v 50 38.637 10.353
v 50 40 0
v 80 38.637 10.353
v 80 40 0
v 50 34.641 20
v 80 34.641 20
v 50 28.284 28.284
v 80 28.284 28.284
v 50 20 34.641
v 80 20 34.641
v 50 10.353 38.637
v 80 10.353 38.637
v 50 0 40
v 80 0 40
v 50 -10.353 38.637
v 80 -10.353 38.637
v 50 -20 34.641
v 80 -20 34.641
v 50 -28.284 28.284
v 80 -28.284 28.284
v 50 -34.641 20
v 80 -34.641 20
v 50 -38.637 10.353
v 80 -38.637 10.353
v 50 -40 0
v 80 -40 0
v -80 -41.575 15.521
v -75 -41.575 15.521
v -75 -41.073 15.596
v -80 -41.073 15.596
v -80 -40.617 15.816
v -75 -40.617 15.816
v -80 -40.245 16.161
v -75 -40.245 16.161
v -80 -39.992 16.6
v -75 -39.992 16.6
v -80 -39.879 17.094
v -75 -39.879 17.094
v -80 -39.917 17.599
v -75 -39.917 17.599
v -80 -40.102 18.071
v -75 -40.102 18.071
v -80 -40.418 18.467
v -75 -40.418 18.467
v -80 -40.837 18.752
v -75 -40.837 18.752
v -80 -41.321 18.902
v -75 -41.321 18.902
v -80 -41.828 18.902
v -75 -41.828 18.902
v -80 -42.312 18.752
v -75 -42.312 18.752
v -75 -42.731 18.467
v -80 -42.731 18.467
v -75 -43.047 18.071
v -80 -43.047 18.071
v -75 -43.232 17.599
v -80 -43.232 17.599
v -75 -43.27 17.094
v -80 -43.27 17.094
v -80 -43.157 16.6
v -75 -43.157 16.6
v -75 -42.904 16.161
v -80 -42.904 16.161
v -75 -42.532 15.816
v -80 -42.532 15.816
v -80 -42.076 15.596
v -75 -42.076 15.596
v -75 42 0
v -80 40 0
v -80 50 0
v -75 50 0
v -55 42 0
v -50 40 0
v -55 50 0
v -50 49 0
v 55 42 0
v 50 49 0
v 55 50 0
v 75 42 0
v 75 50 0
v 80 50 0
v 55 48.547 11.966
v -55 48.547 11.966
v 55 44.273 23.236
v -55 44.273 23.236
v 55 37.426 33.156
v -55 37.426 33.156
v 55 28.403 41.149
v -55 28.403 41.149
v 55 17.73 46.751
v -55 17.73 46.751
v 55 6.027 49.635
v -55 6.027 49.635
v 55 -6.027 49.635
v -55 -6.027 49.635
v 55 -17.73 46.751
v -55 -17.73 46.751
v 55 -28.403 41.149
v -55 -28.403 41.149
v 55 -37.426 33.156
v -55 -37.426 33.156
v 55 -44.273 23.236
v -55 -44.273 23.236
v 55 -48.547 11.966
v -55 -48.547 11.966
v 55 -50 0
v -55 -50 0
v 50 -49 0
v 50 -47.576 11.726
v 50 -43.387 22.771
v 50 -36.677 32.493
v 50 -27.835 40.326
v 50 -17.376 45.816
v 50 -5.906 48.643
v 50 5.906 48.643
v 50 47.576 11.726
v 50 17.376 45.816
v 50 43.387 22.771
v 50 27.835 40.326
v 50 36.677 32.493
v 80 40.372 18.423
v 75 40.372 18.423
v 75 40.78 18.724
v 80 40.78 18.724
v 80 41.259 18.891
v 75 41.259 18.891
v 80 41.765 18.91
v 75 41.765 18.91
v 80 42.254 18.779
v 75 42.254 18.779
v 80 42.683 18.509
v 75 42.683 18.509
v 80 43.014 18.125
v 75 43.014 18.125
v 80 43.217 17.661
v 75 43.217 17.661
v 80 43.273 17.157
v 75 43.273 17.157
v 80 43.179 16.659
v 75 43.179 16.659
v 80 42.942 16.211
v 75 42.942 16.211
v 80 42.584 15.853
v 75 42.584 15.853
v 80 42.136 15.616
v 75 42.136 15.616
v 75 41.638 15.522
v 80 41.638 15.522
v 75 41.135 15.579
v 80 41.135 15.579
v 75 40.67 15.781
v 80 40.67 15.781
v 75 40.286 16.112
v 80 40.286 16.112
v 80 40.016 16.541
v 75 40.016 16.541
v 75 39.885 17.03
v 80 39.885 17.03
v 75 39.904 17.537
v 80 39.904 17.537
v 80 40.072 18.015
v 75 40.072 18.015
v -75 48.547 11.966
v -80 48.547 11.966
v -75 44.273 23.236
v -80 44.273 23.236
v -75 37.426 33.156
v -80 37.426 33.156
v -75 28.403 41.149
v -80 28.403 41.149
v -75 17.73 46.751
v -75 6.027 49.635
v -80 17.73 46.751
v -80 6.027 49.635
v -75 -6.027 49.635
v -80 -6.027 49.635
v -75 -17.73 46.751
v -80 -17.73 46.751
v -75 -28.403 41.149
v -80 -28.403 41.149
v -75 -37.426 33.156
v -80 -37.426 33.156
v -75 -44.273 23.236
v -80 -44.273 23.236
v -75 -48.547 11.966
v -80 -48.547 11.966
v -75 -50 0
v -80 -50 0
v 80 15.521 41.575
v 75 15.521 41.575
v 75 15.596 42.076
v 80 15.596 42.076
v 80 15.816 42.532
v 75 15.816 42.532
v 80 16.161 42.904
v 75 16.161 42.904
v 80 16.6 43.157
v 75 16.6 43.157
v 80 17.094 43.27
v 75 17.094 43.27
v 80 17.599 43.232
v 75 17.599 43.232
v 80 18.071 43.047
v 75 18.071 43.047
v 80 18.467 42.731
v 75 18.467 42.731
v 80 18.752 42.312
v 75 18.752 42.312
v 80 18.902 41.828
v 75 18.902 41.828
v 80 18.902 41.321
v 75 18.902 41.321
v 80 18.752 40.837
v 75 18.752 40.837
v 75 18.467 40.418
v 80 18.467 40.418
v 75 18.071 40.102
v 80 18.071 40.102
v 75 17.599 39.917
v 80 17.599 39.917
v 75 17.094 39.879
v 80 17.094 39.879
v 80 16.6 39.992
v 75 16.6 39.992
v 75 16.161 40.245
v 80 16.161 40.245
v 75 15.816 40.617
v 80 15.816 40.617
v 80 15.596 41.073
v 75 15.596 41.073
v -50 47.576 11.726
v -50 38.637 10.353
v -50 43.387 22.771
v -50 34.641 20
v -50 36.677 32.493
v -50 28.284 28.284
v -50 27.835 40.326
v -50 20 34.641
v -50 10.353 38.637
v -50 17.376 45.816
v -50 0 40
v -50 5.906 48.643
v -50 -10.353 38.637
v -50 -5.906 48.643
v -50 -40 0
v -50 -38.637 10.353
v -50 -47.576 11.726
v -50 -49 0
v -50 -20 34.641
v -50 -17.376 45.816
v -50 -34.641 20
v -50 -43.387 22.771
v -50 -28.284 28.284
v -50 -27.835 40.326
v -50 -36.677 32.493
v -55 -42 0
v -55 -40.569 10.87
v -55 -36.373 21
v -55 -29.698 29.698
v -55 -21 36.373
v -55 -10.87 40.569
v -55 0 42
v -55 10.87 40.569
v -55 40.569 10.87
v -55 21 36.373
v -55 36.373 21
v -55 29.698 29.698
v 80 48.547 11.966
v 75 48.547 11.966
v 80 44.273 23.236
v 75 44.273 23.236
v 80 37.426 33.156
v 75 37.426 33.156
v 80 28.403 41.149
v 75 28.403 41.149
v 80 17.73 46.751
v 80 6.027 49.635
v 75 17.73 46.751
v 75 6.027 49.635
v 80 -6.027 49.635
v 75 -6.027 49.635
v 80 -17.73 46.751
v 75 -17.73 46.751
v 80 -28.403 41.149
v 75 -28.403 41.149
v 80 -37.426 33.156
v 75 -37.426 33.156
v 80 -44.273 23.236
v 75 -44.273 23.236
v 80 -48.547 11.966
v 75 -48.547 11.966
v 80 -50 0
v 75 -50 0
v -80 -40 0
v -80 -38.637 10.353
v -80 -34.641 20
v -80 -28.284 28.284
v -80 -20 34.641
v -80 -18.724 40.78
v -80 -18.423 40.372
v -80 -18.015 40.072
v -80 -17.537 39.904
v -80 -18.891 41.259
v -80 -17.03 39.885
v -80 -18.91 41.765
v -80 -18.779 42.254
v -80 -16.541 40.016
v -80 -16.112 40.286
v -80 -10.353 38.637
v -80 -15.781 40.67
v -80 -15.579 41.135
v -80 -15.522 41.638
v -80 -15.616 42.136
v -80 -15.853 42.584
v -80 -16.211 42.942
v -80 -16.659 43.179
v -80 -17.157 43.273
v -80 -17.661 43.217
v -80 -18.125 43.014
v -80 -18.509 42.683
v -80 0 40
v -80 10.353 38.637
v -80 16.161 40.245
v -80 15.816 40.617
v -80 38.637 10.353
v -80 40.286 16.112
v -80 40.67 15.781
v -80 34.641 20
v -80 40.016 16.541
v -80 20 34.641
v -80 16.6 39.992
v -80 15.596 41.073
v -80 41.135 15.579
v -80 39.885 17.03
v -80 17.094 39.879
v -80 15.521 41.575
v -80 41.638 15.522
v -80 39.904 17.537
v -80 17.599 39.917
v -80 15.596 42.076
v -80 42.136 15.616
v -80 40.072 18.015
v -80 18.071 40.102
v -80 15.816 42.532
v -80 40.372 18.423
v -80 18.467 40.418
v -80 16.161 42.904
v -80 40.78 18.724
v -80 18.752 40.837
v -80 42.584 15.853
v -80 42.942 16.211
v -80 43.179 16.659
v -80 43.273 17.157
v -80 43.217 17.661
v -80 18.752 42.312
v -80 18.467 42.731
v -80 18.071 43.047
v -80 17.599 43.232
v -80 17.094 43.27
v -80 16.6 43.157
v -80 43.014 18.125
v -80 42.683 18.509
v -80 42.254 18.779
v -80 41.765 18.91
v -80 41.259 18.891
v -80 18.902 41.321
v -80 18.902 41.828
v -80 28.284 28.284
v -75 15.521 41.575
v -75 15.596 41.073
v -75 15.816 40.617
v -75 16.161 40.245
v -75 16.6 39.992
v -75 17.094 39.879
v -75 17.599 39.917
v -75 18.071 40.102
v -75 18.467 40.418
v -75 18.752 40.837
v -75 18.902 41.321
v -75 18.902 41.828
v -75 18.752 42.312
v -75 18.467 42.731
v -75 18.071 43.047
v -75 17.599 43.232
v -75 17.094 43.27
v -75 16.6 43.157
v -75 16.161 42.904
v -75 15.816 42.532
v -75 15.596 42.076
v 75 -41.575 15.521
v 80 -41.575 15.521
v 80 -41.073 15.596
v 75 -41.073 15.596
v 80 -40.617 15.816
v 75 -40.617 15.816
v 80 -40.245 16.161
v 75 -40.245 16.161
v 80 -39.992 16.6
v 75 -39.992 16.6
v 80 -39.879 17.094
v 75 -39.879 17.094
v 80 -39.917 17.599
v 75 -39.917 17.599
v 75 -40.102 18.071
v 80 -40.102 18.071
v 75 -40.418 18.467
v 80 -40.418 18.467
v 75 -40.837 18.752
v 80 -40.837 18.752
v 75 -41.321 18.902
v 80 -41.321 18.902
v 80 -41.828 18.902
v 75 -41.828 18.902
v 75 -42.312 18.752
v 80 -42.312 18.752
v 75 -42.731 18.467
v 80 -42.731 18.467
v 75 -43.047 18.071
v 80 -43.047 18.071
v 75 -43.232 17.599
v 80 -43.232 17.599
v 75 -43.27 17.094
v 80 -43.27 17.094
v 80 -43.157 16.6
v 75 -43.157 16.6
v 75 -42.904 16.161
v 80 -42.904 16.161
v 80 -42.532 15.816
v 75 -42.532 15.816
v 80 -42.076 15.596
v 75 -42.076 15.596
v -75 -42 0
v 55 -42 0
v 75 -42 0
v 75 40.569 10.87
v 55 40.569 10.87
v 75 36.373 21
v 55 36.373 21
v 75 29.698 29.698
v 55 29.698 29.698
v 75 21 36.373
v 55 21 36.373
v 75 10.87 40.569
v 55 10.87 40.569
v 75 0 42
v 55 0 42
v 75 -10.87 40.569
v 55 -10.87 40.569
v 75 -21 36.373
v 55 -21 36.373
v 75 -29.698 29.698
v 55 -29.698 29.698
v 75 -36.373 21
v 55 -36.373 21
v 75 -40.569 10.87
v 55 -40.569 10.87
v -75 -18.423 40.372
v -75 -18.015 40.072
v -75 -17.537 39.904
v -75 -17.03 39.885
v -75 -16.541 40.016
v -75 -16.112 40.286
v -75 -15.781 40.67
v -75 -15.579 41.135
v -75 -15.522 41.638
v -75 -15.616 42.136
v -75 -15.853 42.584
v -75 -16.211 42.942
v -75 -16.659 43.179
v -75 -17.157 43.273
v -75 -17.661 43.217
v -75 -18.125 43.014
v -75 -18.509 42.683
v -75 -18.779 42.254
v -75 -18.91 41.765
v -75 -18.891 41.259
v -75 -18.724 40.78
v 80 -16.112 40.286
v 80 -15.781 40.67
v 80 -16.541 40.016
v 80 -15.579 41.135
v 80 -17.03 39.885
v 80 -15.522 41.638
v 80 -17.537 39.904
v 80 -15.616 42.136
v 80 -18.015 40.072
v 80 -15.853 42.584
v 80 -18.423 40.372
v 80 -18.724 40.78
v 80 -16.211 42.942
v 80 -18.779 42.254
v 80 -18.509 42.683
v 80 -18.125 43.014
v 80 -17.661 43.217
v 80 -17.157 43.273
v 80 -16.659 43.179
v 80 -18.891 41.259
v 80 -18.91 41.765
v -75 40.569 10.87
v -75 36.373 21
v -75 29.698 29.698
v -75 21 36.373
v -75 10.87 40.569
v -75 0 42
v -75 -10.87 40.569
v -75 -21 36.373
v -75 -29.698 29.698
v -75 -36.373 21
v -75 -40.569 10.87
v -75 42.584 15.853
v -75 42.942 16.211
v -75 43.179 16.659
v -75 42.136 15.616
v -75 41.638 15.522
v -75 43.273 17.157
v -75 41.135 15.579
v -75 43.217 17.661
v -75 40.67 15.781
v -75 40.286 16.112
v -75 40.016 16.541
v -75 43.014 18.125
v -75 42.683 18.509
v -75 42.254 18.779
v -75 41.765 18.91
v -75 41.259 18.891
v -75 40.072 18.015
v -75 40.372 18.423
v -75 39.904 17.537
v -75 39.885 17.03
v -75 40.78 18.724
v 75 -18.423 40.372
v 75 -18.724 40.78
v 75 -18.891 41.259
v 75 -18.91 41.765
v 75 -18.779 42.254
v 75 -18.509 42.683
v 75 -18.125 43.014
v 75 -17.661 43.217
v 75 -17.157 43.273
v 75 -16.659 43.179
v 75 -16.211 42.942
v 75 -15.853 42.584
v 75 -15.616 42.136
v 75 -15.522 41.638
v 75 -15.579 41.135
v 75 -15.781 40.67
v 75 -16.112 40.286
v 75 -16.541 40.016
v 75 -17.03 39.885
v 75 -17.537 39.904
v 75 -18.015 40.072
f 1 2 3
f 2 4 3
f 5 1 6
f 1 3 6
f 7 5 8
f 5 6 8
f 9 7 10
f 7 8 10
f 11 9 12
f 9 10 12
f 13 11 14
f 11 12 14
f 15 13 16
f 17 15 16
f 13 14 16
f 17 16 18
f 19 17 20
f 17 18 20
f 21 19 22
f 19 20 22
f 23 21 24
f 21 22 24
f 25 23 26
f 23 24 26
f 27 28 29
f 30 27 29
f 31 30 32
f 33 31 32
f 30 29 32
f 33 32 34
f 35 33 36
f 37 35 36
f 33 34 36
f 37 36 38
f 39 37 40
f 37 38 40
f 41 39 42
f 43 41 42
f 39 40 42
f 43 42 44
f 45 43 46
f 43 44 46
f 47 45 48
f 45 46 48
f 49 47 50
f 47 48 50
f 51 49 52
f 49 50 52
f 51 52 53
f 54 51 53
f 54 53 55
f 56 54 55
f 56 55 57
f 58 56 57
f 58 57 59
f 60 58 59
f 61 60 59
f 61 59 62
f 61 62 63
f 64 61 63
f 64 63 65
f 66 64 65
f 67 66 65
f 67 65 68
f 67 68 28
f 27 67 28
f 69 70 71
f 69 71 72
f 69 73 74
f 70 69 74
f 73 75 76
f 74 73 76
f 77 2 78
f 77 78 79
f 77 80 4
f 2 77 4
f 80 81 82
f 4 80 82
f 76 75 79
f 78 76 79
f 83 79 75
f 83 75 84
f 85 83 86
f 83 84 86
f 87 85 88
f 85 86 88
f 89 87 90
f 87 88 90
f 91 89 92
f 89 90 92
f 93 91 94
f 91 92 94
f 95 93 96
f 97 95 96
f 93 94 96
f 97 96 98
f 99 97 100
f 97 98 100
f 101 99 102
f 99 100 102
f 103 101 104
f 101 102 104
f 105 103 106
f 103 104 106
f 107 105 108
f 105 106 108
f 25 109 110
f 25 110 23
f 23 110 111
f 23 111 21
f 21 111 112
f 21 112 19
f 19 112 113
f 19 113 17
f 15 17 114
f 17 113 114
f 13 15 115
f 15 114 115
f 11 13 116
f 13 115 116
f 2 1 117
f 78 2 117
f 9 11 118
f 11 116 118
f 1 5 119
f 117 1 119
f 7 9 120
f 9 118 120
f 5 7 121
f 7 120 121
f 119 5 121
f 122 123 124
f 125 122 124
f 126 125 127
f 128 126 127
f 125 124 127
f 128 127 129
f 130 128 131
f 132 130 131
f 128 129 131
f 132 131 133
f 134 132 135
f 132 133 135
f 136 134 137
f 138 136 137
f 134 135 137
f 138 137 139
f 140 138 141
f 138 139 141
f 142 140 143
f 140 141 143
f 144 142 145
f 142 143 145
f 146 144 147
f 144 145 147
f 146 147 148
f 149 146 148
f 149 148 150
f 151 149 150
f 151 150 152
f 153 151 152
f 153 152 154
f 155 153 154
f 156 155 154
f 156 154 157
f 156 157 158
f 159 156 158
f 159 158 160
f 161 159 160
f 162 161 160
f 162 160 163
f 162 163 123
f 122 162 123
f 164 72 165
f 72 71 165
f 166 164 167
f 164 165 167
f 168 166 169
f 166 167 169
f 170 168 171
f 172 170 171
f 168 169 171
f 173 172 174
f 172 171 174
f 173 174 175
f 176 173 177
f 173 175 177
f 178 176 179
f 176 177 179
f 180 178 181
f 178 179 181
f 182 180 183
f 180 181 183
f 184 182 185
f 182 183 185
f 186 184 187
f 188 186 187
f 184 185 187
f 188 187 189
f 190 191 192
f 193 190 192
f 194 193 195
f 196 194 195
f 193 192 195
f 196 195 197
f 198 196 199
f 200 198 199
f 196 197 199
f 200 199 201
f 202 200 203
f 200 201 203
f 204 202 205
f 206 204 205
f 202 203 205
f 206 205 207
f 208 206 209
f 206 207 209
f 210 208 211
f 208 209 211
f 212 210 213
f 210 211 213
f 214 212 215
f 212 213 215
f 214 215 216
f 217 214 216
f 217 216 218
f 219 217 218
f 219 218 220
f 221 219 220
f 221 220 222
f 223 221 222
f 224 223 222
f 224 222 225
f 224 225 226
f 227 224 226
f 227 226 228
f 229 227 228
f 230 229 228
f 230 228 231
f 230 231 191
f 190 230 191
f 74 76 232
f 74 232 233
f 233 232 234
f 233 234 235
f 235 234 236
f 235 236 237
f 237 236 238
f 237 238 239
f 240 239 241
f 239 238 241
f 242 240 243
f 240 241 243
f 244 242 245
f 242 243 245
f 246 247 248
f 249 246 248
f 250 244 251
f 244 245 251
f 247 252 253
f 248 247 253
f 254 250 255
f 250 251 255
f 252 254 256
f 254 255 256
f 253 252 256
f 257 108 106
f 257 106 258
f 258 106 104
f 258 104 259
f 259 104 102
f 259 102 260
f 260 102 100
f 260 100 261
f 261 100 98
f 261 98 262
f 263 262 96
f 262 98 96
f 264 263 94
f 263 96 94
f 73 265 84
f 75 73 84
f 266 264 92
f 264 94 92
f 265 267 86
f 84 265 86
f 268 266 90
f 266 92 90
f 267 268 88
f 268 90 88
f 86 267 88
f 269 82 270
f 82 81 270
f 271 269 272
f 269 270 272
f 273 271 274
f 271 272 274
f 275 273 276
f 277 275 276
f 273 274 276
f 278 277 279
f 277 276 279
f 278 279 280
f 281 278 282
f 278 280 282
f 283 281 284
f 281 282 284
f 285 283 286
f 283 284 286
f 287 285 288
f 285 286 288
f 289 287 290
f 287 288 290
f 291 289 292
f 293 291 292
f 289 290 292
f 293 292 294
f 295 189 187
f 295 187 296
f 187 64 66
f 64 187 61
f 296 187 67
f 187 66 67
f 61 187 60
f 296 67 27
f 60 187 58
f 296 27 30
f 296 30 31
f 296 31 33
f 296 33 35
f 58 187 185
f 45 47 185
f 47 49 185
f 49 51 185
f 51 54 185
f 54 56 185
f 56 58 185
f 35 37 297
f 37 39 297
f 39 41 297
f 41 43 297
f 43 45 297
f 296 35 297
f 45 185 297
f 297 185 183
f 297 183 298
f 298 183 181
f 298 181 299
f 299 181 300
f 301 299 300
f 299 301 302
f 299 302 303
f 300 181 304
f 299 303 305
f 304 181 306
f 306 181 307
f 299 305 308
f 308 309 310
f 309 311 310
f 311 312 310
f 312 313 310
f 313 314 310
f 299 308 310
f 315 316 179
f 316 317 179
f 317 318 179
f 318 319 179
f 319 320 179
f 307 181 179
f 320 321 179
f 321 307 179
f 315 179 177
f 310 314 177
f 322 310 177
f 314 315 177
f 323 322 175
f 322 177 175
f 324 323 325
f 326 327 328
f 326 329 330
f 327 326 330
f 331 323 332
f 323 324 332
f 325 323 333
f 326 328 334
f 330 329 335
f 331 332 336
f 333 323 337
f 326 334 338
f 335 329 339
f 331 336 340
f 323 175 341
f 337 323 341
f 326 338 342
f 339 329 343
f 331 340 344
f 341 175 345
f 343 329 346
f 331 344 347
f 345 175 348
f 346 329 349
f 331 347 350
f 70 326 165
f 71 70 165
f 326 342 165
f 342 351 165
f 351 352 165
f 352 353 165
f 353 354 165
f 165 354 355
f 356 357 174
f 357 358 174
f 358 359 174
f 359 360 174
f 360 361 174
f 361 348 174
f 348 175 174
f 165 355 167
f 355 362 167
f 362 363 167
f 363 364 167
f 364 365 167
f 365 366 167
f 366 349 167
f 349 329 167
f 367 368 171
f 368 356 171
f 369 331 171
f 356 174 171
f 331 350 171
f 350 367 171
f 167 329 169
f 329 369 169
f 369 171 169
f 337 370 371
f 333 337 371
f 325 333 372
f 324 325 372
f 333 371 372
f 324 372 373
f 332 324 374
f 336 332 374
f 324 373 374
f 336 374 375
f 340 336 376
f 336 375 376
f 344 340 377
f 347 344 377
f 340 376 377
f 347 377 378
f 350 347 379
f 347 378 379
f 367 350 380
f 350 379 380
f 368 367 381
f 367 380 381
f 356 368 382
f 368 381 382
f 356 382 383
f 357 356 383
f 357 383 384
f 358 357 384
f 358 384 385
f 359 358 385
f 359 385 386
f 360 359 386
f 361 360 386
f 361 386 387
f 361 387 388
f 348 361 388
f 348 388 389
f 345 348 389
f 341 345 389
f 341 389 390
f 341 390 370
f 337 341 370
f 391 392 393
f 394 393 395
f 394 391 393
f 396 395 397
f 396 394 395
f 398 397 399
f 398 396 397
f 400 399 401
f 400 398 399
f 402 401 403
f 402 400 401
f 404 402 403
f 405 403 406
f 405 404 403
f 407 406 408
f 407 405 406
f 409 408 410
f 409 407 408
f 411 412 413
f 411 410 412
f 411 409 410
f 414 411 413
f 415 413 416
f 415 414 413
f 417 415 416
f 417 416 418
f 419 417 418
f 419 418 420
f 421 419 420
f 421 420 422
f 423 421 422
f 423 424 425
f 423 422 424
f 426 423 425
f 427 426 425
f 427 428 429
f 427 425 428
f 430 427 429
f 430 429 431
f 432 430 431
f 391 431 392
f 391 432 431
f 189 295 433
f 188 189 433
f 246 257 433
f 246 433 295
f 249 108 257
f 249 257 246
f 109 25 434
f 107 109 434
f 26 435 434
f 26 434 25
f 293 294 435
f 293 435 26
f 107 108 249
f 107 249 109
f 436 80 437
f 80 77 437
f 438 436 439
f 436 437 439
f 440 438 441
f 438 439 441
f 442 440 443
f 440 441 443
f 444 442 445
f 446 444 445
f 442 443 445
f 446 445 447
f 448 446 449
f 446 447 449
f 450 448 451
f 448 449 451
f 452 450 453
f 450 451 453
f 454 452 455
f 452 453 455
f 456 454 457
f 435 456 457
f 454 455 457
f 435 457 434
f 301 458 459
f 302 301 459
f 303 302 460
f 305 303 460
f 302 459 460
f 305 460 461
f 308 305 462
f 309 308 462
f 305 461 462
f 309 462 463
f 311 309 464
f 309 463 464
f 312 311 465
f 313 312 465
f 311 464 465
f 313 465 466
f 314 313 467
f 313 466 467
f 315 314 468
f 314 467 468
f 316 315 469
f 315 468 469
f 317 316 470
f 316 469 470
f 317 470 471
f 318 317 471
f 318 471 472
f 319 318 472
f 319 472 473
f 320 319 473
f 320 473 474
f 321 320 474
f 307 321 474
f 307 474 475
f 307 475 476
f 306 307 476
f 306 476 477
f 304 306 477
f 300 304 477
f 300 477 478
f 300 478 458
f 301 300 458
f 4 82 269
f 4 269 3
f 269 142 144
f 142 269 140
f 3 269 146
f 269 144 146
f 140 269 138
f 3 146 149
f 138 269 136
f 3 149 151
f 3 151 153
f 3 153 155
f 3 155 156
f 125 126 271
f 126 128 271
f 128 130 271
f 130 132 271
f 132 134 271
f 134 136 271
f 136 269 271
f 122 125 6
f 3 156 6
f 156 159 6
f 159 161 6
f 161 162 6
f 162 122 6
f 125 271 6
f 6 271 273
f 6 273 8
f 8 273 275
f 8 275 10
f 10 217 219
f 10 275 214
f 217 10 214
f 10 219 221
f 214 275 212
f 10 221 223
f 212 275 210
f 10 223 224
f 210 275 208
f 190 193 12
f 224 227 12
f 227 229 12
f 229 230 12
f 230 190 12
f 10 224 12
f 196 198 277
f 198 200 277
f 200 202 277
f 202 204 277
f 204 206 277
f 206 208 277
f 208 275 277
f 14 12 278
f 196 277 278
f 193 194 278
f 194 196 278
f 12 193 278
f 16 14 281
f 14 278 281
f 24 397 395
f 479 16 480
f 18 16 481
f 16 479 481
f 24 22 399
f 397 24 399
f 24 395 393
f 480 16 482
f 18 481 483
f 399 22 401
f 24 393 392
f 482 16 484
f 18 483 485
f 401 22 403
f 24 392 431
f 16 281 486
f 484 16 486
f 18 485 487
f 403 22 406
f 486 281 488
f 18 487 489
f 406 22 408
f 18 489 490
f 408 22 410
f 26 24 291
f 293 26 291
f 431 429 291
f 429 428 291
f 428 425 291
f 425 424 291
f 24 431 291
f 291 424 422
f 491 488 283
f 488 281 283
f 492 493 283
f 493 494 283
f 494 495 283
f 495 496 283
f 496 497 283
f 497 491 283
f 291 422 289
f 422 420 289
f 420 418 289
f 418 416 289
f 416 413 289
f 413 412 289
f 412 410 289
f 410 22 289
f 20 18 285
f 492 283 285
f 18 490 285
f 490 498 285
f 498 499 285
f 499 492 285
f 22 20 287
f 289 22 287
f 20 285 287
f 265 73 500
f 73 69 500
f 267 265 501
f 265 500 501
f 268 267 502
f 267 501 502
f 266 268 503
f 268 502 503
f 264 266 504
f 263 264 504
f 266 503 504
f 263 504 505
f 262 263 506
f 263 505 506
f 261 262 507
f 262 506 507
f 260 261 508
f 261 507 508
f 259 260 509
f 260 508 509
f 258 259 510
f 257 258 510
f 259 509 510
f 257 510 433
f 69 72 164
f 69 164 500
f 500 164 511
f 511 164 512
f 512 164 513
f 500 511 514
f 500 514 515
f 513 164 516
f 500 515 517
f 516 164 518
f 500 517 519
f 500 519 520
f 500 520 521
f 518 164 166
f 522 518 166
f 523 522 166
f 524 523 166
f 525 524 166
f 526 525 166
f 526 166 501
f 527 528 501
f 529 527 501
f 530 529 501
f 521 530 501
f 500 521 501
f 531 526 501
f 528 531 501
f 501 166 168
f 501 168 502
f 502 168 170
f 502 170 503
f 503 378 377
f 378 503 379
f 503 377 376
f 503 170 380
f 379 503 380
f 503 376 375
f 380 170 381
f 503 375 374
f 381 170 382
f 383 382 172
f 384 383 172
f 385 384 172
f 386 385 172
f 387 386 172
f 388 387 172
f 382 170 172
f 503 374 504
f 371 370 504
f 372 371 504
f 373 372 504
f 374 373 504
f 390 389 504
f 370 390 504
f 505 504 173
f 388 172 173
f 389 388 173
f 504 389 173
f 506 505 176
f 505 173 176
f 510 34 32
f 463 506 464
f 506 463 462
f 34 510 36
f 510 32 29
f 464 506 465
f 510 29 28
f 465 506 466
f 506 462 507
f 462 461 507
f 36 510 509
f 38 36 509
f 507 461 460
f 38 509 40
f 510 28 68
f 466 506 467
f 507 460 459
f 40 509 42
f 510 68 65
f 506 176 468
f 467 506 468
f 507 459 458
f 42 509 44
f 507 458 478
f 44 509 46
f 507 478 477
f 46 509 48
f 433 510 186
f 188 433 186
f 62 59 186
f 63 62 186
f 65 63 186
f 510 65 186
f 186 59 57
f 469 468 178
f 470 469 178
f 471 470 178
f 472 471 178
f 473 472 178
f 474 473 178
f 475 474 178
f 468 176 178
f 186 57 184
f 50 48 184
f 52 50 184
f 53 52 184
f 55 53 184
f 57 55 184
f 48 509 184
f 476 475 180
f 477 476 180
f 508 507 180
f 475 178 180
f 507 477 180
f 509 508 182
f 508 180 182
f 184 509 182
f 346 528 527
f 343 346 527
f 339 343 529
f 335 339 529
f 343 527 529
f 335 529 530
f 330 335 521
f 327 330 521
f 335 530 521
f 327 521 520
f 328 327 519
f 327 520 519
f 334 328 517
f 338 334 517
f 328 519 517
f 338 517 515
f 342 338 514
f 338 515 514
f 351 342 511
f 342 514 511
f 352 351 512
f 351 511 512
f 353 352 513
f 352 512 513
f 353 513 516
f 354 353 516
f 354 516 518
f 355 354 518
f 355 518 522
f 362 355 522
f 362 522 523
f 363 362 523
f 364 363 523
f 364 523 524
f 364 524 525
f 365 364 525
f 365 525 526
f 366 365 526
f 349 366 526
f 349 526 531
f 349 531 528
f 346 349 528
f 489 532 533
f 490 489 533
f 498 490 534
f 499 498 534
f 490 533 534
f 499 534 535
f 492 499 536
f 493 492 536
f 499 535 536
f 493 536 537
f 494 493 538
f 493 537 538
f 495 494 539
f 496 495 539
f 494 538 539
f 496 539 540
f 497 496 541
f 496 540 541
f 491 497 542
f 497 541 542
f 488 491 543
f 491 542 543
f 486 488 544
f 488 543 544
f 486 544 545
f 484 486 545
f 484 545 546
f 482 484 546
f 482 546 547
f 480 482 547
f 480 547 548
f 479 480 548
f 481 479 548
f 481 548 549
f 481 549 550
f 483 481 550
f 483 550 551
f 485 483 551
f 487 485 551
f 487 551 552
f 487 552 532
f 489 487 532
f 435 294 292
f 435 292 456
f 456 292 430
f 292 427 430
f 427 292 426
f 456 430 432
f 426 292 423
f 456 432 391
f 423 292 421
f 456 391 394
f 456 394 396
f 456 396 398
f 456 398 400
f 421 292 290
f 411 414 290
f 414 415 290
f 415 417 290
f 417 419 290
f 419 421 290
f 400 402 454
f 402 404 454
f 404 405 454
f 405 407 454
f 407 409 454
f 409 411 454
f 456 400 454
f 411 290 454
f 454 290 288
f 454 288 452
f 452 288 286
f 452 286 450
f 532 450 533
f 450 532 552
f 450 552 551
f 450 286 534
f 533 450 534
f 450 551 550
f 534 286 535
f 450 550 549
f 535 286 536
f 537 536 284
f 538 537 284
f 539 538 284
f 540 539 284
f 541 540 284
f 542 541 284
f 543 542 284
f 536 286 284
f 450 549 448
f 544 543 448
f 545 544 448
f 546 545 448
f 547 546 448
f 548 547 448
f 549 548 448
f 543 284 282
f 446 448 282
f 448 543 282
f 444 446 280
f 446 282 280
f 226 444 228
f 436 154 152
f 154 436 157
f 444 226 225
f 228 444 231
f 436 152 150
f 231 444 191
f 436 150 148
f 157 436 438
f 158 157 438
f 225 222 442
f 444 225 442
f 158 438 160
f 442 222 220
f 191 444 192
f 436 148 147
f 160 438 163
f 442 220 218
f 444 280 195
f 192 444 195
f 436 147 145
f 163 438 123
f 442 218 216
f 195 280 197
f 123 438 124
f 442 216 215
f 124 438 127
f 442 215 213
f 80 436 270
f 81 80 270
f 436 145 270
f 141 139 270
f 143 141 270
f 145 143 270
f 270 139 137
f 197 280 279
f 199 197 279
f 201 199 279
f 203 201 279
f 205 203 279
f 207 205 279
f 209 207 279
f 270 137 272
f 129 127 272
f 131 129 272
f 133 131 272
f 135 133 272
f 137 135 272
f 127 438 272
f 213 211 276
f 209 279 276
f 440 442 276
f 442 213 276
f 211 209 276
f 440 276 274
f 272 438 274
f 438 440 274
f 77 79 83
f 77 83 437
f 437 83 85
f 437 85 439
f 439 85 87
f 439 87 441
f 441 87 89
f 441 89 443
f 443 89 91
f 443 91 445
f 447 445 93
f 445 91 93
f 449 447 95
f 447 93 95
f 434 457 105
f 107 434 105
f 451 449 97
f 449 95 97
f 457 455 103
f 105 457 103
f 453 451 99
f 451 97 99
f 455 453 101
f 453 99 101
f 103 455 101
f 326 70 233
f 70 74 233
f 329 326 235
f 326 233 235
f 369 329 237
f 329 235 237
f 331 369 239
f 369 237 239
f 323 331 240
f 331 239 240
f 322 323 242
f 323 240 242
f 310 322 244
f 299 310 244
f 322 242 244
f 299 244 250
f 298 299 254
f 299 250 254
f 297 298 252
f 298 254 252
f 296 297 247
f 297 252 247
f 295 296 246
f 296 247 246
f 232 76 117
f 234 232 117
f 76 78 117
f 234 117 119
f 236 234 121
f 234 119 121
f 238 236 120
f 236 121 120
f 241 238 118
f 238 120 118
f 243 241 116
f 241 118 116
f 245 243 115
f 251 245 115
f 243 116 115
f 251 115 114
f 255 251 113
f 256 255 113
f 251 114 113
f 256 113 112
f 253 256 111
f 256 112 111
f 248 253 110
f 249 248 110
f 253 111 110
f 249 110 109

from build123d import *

# Parameters (mm, degrees)
REVOLVE_1_ANGLE          = 180
HOLE_WIZARD_M3_1_D       = 3.4
HOLE_WIZARD_M3_1_DEPTH   = 5
PATTERN_CIRCULAR_1_COUNT = 4
PATTERN_CIRCULAR_1_ANGLE = 135
MIRROR_1_COPY_1_D        = 3.4
MIRROR_1_COPY_1_DEPTH    = 5
MIRROR_1_COPY_2_D        = 3.4
MIRROR_1_COPY_2_DEPTH    = 5
MIRROR_1_COPY_3_D        = 3.4
MIRROR_1_COPY_3_DEPTH    = 5


with BuildPart() as part:
    # ｽｹｯﾁ1 → 回転1 (revolve)
    with BuildSketch(Plane.XY):
        Polygon((-80, 40), (-50, 40), (-50, 49), (50, 49), (50, 40), (80, 40), (80, 50), (75, 50), (75, 42), (55, 42), (55, 50), (-55, 50), (-55, 42), (-75, 42), (-75, 50), (-80, 50), align=None)
    revolve(axis=Axis((-50, 0, 0), (1, 0, 0)), revolution_arc=REVOLVE_1_ANGLE)

    # M3 すきま穴1
    with Locations(Plane.ZY.offset(80)):
        with Locations((17.220754456, -41.574578963)):
            hole_wizard_m3_1 = Hole(HOLE_WIZARD_M3_1_D / 2, depth=HOLE_WIZARD_M3_1_DEPTH)

    # 円形ﾊﾟﾀｰﾝ1: M3 すきま穴1 ×4 about axis
    pattern_circular_1_axis = Axis((0, 0, 0), (-1, 0, 0))
    for i in range(1, PATTERN_CIRCULAR_1_COUNT):
        add(hole_wizard_m3_1.rotate(pattern_circular_1_axis, i * PATTERN_CIRCULAR_1_ANGLE / (PATTERN_CIRCULAR_1_COUNT - 1)), mode=Mode.SUBTRACT)

    # ﾐﾗｰ1: M3 すきま穴1 across plane
    add(hole_wizard_m3_1.mirror(Plane(origin=(0, 0, 0), x_dir=(0, 0, 1), z_dir=(1, 0, 0))), mode=Mode.SUBTRACT)

    # ﾐﾗｰ1 copy 1
    with Locations(Plane(origin=(80, 0, 0), x_dir=(0, 0.7071067811865487, 0.7071067811865464), z_dir=(1, 0, 0))):
        with Locations((17.220754456, 41.574578963)):
            Hole(MIRROR_1_COPY_1_D / 2, depth=MIRROR_1_COPY_1_DEPTH)

    # ﾐﾗｰ1 copy 2
    with Locations(Plane.YZ.offset(80)):
        with Locations((17.220754456, 41.574578963)):
            Hole(MIRROR_1_COPY_2_D / 2, depth=MIRROR_1_COPY_2_DEPTH)

    # ﾐﾗｰ1 copy 3
    with Locations(Plane(origin=(80, 0, 0), x_dir=(0, 0.7071067811865441, -0.7071067811865509), z_dir=(1, 0, 0))):
        with Locations((17.220754456, 41.574578963)):
            Hole(MIRROR_1_COPY_3_D / 2, depth=MIRROR_1_COPY_3_DEPTH)


solid = part.part
